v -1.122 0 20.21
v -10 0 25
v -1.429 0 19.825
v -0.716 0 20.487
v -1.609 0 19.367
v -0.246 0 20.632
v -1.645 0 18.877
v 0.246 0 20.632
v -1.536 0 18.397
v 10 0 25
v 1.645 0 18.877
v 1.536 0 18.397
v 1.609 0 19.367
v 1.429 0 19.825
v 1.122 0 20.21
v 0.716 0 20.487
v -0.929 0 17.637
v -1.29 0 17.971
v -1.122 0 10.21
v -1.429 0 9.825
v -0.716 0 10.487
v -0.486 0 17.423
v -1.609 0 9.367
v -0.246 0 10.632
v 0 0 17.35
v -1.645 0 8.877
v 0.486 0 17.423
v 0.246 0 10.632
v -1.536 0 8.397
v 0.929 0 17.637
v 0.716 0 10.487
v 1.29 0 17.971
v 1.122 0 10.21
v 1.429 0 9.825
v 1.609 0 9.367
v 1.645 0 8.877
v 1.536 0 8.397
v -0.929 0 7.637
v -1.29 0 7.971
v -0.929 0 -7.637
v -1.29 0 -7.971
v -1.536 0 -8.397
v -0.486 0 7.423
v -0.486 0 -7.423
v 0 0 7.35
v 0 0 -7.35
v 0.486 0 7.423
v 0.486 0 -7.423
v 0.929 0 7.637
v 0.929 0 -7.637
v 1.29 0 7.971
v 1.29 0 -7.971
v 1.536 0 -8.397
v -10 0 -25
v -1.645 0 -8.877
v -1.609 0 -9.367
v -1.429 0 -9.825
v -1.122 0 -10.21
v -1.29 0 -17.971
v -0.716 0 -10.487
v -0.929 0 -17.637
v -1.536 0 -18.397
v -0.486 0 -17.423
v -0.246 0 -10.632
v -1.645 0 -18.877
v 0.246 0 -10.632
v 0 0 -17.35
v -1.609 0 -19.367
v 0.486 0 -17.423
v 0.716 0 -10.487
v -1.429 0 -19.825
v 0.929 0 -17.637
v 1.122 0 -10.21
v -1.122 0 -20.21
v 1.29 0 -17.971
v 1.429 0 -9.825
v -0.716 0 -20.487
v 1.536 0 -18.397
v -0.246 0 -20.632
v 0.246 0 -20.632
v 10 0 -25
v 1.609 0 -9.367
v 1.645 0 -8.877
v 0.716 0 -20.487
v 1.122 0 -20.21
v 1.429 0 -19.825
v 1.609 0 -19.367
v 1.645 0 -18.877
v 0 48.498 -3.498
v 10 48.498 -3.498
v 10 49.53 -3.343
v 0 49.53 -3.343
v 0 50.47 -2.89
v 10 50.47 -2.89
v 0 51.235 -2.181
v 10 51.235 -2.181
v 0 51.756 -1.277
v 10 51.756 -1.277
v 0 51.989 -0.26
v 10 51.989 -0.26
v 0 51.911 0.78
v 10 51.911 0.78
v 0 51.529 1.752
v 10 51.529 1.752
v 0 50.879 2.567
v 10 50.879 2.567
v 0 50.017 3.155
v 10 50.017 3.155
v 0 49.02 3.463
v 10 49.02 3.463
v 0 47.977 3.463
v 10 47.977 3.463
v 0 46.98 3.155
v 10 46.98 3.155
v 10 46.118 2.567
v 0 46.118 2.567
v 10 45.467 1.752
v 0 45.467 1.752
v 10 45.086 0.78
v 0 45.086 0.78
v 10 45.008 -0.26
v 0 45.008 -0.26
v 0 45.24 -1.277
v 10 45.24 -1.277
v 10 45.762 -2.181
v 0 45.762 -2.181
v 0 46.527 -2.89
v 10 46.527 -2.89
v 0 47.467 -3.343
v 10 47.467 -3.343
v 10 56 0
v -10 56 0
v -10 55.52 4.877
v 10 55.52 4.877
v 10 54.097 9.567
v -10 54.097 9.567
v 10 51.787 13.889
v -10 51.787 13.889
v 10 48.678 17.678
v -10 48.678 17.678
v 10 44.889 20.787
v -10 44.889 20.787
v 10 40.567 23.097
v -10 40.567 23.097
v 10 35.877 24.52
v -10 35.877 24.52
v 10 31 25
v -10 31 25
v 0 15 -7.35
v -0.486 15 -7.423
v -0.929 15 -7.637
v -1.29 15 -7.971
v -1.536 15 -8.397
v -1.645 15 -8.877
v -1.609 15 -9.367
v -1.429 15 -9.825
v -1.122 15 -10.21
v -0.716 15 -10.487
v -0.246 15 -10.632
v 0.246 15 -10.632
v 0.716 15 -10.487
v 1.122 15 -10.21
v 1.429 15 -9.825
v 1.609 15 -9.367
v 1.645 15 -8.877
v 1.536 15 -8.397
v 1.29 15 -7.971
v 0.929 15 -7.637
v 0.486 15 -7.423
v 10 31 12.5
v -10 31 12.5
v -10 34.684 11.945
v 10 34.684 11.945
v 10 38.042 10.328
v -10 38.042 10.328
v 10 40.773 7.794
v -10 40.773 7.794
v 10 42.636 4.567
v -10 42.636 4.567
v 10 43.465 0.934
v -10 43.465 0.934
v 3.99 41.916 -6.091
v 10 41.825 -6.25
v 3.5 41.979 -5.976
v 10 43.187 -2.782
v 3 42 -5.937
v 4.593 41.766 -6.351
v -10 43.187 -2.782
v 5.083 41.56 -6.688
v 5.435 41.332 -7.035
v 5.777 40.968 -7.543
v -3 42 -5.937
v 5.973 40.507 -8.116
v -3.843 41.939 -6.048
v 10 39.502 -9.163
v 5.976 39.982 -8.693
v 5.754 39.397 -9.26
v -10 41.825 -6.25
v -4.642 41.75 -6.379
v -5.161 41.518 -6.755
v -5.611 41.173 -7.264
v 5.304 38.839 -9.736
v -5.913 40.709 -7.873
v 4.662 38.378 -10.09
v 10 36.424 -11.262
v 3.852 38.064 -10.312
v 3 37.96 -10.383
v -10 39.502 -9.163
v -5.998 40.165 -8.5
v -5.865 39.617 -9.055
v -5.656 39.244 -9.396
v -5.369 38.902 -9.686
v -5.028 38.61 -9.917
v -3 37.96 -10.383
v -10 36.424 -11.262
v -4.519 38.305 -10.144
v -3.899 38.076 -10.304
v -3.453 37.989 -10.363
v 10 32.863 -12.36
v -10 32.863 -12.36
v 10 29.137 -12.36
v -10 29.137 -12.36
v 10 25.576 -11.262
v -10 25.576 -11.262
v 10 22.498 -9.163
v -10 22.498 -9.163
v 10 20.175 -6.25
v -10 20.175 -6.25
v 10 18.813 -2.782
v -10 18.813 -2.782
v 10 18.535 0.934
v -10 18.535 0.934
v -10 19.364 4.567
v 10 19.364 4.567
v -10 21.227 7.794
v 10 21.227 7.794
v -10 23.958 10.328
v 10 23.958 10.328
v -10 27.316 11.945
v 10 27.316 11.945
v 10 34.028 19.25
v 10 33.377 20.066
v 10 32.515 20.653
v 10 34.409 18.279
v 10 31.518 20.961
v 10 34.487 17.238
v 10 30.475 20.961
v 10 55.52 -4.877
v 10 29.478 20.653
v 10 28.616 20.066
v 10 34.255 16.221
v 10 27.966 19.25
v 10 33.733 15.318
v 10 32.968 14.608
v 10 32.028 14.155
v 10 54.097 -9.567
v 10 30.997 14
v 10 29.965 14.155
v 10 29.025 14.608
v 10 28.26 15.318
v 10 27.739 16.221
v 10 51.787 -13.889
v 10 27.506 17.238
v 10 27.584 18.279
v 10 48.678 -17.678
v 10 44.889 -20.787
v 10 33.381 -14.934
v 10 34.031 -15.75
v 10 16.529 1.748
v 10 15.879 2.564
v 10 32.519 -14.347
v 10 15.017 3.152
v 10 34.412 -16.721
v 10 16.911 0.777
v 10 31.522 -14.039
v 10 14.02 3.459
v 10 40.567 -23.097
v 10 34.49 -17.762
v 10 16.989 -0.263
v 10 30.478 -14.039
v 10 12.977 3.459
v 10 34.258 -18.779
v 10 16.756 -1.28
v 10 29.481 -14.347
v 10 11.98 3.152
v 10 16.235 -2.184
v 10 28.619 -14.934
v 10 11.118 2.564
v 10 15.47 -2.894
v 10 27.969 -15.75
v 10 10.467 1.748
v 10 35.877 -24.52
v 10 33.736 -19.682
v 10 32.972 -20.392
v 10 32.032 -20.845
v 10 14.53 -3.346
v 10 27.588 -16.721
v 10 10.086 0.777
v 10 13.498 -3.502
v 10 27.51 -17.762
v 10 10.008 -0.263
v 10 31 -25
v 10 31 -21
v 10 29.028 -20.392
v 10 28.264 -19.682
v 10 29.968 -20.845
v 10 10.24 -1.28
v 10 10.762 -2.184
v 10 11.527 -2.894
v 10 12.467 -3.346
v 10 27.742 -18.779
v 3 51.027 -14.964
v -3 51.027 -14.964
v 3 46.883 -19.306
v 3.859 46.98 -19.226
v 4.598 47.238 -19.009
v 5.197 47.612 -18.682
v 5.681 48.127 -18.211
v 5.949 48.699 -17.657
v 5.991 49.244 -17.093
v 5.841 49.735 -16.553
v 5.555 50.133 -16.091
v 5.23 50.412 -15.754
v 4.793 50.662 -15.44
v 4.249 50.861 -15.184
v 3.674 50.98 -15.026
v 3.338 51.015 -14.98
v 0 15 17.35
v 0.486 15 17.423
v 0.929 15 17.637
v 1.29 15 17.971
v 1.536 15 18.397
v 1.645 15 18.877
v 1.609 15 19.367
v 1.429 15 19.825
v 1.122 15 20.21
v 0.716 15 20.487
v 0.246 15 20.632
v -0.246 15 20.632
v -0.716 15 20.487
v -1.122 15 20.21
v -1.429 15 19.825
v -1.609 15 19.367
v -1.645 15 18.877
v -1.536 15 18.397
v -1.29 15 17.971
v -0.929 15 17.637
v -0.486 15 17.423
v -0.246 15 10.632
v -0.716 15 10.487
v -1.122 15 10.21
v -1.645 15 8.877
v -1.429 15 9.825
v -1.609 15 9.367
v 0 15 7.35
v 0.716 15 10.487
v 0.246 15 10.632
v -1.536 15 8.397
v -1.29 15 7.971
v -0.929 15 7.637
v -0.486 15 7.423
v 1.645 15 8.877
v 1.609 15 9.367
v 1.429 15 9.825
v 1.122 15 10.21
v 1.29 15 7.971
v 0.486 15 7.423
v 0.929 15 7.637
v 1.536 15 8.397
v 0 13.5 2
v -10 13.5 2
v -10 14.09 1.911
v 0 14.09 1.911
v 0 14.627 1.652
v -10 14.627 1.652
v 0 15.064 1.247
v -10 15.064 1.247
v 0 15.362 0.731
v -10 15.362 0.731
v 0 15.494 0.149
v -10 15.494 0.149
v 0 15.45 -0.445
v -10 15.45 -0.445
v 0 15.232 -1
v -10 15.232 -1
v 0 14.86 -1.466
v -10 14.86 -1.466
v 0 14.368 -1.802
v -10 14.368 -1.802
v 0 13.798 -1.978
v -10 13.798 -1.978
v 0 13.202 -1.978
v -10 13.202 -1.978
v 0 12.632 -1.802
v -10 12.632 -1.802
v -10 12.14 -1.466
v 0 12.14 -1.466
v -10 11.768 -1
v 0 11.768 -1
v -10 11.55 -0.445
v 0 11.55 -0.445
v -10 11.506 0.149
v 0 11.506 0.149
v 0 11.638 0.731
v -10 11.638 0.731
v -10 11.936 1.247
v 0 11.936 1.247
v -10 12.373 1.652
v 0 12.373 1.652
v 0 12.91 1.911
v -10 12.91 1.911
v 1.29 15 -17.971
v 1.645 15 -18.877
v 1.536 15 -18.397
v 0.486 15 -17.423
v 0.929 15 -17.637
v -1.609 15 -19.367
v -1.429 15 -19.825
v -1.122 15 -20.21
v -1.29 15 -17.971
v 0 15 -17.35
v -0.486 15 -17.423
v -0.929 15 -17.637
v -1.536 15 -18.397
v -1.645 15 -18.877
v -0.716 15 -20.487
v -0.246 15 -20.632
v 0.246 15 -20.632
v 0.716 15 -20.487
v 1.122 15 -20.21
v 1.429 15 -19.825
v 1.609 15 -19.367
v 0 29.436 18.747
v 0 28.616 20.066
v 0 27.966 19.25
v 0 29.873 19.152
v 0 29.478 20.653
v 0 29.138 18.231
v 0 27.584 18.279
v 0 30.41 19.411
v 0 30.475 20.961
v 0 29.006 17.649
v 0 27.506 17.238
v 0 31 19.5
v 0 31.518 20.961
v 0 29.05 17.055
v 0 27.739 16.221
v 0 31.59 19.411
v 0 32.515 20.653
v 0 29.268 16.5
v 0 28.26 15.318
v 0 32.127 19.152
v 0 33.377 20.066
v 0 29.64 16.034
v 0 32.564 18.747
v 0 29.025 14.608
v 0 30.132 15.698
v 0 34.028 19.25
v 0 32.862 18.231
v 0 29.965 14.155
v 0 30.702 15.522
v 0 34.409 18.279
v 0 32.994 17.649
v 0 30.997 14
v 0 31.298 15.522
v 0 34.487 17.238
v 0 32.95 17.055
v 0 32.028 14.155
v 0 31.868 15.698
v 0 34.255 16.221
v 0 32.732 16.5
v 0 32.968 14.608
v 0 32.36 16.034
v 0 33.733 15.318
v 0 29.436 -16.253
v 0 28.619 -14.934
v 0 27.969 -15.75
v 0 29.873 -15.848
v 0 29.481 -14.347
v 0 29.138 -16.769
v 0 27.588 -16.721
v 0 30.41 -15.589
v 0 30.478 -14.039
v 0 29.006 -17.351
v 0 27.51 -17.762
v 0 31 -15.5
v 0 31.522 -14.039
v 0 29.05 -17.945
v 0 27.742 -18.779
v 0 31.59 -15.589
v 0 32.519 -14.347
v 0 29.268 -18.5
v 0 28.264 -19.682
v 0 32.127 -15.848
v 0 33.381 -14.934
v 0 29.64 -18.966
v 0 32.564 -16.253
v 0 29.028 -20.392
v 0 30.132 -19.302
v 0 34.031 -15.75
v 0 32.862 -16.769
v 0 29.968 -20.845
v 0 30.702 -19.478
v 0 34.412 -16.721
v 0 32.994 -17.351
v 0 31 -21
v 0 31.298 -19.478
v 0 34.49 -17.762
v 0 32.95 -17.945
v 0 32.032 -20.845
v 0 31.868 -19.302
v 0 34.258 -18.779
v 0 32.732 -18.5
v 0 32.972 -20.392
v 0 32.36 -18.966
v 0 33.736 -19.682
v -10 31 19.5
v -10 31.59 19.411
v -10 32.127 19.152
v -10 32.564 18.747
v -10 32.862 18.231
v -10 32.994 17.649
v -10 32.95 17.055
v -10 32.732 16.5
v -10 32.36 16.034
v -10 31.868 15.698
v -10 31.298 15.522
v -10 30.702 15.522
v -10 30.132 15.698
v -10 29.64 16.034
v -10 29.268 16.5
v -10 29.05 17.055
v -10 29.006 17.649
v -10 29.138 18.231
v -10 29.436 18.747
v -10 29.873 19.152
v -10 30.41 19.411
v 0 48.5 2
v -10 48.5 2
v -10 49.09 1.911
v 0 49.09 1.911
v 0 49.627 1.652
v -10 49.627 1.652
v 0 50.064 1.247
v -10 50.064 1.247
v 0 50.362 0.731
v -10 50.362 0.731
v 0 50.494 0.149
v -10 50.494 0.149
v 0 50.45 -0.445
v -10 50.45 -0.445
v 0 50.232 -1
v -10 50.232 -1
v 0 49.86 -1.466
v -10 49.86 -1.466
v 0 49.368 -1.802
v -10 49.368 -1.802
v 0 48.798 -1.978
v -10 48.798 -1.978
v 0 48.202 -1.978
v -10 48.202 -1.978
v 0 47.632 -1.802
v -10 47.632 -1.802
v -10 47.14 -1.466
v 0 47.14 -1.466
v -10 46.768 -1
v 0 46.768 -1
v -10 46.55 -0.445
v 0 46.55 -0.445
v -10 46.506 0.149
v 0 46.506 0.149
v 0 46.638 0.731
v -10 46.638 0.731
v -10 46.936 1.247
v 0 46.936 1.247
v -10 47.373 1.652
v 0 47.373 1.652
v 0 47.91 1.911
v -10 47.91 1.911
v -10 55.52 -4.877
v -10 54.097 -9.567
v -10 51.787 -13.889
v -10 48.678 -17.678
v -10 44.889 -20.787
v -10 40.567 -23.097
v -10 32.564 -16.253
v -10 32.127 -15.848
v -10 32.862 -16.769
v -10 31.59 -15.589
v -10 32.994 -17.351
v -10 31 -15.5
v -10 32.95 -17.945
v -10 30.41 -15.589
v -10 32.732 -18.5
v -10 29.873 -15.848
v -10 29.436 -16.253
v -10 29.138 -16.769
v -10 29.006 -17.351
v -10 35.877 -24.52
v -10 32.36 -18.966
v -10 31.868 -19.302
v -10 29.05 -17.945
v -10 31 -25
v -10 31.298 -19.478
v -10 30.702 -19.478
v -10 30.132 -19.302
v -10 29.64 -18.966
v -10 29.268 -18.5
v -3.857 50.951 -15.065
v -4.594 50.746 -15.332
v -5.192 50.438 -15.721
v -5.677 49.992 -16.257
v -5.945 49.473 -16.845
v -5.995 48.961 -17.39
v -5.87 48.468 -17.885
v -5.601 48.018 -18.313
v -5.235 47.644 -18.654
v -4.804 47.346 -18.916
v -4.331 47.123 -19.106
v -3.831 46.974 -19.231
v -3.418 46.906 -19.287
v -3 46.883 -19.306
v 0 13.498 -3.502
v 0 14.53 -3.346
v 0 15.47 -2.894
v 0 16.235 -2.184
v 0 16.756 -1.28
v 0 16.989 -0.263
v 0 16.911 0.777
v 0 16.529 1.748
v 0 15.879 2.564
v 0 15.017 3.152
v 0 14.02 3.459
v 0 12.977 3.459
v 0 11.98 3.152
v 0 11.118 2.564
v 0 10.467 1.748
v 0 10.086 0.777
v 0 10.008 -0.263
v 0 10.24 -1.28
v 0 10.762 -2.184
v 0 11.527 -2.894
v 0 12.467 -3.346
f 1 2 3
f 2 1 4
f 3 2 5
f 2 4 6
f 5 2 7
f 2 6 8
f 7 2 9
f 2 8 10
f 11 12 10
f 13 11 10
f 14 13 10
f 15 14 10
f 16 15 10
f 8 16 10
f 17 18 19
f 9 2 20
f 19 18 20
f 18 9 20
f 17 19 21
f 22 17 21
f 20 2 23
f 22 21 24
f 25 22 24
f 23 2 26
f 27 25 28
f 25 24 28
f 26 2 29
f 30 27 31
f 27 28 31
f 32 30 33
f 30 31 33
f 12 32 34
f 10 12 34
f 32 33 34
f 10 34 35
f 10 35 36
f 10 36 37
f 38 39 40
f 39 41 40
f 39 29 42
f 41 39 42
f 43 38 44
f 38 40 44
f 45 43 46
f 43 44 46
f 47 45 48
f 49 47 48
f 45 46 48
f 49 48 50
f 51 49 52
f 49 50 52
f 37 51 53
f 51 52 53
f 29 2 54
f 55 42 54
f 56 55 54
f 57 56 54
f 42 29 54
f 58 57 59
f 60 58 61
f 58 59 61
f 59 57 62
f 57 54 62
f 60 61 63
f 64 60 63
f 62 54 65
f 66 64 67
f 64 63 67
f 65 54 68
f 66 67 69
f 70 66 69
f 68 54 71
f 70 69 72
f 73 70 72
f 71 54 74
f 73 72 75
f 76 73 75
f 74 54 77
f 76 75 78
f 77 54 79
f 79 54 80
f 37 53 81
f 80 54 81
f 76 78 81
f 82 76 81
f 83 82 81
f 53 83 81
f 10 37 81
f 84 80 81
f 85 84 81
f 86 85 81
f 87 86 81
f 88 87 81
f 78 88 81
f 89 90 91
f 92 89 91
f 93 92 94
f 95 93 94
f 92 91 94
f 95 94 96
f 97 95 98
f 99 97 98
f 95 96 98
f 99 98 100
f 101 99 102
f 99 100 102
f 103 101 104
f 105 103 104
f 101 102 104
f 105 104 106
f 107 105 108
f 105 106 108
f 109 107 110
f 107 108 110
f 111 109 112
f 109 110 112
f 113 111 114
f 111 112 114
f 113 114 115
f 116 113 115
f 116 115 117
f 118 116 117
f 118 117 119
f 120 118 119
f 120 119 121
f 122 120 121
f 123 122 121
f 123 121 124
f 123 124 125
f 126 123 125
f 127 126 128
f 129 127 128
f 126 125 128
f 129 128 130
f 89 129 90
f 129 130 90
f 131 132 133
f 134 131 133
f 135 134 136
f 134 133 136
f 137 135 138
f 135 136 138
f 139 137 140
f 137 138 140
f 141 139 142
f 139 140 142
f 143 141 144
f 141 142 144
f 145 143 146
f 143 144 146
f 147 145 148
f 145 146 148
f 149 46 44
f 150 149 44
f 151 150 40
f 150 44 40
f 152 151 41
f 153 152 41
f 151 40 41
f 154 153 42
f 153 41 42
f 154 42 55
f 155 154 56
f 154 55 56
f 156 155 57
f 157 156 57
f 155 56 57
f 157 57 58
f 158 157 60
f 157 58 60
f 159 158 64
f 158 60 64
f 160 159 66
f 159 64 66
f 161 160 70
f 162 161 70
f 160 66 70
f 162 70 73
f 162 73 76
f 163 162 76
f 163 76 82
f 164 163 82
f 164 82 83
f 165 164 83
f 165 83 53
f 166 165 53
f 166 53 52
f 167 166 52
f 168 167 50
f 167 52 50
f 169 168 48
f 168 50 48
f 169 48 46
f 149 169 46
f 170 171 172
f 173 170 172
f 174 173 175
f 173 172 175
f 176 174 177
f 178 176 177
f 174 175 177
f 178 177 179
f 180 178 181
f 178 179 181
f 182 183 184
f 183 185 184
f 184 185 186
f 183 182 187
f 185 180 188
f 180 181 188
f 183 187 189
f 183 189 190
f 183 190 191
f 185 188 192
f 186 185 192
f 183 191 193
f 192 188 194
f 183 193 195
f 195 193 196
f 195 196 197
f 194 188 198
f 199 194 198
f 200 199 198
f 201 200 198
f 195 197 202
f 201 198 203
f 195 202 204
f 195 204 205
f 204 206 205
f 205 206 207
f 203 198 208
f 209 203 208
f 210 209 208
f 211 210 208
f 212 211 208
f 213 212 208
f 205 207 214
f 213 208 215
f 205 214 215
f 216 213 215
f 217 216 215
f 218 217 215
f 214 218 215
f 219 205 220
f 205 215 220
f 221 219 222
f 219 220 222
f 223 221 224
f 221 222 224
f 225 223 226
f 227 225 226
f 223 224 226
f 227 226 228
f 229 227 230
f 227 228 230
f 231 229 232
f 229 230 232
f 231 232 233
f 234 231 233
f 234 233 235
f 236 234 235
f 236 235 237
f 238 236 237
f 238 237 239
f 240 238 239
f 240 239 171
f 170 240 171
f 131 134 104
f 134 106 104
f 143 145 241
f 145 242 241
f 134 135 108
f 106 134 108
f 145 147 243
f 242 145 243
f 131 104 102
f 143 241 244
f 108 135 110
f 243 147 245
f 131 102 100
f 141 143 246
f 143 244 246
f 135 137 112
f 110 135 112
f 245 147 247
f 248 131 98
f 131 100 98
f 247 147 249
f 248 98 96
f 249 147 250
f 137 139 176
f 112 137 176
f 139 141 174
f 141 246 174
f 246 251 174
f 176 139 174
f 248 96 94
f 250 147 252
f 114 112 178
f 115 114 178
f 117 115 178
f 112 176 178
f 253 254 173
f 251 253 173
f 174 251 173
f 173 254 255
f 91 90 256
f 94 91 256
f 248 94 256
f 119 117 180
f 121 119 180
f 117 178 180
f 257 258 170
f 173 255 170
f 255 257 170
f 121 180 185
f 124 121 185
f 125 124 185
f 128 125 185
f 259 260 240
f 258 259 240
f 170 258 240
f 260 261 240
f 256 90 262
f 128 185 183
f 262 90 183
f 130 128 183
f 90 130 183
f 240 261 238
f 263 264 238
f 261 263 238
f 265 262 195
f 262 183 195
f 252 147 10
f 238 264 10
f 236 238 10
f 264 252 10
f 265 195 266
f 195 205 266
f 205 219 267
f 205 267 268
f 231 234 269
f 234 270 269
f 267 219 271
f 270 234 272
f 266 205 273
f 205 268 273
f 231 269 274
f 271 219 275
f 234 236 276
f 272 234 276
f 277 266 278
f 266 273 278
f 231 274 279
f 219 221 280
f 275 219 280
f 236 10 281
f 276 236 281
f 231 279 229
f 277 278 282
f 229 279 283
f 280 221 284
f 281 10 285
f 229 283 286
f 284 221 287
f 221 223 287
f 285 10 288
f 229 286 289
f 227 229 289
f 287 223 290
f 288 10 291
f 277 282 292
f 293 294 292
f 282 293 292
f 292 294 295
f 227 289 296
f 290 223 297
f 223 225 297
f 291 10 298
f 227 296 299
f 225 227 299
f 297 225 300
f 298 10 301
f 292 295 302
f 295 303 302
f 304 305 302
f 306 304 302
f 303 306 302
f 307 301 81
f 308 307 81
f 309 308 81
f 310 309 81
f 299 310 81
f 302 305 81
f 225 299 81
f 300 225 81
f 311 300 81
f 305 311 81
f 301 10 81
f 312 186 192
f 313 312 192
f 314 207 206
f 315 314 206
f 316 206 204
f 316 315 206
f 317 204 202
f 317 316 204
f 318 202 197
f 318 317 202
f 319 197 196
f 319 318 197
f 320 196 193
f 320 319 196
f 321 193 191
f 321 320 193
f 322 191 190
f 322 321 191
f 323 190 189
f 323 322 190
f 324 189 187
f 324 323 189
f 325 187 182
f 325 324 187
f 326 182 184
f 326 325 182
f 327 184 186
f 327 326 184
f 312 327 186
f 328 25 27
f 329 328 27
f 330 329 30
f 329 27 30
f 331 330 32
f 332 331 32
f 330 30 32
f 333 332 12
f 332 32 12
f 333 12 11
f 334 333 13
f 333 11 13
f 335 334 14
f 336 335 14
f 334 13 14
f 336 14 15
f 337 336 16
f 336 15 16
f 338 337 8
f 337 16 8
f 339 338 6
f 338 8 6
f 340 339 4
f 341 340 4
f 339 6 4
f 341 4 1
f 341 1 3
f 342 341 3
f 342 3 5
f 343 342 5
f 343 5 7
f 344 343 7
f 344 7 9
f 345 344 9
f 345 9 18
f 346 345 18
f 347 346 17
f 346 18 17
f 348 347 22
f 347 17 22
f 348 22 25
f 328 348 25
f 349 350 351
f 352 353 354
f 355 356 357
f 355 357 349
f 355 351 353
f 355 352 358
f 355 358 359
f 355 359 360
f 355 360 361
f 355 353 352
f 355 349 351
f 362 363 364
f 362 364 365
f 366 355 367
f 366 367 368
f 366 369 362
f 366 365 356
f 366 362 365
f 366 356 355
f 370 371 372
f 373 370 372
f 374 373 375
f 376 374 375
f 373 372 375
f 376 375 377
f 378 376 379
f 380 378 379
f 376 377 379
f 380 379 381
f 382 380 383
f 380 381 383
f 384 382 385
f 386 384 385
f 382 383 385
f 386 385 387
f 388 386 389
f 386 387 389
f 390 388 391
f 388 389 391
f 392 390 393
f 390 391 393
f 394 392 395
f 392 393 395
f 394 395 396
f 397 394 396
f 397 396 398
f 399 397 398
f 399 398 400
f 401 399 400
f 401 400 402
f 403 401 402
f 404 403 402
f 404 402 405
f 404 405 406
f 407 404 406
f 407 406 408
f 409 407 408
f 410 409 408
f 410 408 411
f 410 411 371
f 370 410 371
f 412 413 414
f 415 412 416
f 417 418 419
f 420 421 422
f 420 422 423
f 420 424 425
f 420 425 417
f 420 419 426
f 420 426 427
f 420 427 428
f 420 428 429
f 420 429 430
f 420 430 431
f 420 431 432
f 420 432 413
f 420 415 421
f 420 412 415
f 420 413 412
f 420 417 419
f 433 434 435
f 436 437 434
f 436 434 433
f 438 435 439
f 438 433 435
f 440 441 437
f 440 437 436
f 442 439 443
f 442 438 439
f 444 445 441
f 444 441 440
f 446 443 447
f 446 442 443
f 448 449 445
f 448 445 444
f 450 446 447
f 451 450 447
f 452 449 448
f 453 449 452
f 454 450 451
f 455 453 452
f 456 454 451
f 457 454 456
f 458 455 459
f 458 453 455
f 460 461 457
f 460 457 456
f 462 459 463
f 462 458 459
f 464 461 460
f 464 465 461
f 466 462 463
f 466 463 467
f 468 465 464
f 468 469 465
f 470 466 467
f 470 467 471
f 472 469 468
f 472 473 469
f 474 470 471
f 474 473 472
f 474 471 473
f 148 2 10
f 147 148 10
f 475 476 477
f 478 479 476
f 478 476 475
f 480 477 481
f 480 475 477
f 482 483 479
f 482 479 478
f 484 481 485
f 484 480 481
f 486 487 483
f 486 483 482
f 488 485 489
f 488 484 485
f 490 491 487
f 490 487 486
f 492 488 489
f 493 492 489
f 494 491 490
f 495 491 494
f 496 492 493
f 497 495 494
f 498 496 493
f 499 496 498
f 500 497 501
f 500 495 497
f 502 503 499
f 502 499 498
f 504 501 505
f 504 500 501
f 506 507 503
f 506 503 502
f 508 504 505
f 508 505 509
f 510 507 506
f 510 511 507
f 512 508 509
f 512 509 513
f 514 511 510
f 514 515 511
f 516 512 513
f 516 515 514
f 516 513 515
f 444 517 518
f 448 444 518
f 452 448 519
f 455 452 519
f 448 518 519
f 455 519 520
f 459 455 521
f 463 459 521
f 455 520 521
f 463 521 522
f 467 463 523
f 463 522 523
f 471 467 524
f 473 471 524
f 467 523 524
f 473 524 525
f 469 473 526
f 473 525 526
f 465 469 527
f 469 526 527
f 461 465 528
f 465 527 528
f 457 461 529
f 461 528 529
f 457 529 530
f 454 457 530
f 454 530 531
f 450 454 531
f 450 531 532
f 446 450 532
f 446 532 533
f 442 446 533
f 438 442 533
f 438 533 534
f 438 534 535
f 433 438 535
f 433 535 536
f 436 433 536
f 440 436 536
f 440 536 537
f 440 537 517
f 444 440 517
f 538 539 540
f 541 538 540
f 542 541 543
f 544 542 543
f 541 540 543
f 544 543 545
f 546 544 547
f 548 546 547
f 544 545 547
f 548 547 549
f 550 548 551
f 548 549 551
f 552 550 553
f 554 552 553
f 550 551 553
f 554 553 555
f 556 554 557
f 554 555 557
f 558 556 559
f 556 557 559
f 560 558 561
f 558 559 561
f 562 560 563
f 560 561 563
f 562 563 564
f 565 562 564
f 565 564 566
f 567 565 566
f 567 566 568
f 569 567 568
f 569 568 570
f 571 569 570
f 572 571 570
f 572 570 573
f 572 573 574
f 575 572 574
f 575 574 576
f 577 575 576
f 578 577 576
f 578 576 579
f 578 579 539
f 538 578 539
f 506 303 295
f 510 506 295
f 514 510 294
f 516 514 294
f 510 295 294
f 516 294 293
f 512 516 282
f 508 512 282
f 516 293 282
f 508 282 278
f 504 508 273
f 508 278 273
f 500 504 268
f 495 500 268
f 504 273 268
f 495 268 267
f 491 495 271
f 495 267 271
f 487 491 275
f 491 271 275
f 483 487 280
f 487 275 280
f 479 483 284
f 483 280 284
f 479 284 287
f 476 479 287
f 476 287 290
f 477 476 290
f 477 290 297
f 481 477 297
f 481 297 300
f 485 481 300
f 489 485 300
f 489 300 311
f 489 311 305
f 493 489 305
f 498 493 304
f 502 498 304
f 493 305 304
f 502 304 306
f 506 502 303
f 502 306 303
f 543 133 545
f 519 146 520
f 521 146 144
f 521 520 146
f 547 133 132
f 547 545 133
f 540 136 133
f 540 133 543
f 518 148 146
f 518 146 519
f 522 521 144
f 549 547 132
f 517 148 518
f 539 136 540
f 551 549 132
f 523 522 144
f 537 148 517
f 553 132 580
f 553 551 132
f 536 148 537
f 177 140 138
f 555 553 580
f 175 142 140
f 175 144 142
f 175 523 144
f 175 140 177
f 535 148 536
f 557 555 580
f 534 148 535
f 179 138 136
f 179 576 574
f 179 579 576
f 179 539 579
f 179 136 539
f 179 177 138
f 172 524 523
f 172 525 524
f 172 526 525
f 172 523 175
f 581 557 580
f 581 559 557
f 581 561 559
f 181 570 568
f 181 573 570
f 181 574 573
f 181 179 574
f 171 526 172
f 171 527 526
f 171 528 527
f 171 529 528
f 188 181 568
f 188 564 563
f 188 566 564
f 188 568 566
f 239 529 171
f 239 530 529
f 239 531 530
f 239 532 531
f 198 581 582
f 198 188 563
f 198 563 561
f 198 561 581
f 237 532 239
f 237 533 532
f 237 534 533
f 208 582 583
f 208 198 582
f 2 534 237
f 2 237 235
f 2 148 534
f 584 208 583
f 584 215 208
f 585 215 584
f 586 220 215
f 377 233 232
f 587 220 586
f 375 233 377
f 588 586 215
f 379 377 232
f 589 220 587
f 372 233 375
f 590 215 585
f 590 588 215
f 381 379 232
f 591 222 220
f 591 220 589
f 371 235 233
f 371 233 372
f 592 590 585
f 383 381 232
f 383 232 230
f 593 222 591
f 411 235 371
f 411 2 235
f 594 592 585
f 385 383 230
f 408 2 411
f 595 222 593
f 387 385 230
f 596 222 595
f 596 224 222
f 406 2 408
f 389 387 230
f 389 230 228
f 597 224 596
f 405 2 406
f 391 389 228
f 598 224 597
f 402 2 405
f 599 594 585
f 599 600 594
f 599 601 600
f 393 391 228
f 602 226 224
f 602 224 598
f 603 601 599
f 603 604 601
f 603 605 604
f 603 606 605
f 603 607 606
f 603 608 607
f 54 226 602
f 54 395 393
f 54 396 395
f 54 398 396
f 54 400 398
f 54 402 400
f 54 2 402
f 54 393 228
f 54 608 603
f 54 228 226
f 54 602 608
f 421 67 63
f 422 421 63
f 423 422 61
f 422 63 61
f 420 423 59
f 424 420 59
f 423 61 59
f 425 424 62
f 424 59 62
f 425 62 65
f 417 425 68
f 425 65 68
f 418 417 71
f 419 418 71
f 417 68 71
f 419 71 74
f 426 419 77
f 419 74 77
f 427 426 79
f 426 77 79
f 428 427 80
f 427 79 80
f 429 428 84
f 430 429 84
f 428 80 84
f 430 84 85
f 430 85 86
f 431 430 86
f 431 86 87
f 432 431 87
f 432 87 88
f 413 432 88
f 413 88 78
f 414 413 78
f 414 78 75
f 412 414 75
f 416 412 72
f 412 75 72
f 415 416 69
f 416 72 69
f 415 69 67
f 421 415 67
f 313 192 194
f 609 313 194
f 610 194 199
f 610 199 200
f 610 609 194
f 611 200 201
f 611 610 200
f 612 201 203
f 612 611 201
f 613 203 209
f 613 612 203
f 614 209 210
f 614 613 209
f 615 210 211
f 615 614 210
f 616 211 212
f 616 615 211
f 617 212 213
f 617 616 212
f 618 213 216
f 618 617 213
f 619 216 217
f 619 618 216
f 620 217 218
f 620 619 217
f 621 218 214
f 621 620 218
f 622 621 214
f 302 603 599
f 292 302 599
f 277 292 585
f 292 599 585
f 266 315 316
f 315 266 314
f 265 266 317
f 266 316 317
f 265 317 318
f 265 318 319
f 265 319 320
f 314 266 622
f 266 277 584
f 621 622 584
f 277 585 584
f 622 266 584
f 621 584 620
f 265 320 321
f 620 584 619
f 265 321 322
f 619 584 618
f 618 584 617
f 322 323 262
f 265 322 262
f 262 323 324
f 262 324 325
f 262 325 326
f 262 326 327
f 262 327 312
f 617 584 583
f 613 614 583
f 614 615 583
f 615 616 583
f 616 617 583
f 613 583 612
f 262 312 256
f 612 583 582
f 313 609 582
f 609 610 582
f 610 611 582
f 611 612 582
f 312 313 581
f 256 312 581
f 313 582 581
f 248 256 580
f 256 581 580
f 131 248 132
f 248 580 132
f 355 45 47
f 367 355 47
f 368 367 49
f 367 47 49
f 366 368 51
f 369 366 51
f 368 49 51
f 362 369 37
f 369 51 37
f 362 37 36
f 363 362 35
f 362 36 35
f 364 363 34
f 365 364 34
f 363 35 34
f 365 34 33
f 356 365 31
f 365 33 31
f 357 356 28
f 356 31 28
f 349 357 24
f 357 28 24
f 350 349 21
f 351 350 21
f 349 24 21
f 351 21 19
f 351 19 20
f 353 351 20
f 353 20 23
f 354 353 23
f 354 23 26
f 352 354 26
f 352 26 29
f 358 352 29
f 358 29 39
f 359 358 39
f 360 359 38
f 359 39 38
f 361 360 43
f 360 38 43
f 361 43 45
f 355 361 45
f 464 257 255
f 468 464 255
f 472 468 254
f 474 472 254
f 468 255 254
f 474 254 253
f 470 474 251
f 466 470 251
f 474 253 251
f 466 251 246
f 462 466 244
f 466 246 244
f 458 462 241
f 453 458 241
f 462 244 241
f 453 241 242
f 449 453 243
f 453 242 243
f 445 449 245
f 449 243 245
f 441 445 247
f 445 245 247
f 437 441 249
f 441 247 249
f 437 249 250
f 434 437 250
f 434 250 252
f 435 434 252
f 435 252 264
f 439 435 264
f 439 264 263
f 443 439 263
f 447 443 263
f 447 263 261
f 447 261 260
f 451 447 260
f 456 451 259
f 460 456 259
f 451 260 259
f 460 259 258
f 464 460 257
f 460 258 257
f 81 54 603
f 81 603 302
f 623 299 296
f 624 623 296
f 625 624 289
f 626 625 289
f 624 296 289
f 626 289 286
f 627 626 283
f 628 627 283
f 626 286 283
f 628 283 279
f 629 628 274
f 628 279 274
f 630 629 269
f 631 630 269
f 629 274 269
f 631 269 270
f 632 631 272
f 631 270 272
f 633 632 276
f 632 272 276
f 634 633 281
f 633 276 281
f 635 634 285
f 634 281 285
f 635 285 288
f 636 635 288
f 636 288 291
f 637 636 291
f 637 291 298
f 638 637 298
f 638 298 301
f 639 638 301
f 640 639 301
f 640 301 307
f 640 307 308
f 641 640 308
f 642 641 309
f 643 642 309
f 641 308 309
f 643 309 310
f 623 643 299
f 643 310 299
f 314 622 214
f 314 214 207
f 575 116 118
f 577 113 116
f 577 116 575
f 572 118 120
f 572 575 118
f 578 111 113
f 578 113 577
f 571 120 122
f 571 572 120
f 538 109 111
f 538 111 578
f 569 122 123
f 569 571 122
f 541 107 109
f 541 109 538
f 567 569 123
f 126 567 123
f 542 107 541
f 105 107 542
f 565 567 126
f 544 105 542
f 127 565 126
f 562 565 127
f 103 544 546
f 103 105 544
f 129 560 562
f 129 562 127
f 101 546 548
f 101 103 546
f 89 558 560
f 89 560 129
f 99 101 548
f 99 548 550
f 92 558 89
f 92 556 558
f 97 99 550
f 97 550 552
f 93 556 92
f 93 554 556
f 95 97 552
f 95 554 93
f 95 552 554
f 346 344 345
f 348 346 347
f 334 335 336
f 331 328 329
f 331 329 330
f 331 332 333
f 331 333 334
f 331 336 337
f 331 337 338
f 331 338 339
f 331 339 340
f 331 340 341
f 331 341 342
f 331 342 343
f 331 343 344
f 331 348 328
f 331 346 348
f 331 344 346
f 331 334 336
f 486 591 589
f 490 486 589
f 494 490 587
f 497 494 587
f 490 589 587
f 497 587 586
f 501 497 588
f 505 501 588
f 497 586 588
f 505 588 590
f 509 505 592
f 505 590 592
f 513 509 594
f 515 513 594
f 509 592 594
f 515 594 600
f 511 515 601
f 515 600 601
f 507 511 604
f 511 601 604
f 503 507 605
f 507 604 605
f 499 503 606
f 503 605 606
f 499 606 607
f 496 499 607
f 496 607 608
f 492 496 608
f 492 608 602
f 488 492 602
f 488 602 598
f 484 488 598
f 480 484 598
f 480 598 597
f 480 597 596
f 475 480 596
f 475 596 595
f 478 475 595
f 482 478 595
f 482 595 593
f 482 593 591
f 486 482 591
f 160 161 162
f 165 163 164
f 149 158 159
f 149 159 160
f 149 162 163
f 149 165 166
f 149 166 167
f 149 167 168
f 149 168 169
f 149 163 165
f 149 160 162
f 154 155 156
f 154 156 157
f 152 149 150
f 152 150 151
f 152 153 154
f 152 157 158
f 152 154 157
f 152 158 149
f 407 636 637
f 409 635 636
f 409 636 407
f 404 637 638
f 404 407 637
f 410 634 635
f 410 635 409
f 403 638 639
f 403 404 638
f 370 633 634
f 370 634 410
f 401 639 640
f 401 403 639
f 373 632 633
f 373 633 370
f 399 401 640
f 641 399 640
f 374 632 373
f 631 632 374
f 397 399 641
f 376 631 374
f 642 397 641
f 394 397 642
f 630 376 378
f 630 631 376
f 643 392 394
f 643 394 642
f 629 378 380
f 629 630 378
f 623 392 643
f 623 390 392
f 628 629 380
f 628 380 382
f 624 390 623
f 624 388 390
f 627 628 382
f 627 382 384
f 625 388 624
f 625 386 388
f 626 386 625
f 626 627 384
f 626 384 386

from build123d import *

# Parameters (mm, degrees)
SKIZZE1_W                       = 20
SKIZZE1_H                       = 50
AUFSATZ_LINEAR_AUSTRAGEN1_DEPTH = 56
SKIZZE2_R                       = 12.5
SKIZZE2_R_2                     = 2
SCHNITT_LINEAR_AUSTRAGEN1_DEPTH = 65.505813691
SKIZZE3_R                       = 1.65
SCHNITT_LINEAR_AUSTRAGEN2_DEPTH = 15
SKIZZE6_R                       = 3.5
SCHNITT_LINEAR_AUSTRAGEN5_DEPTH = 10
CUT_EXTRUDE1_DEPTH              = 17


with BuildPart() as part:
    # Skizze1 → Aufsatz-Linear austragen1 (new body)
    with BuildSketch(Plane(origin=(0, 0, 0), x_dir=(1, 0, 0), z_dir=(0, 1, 0))):
        Rectangle(SKIZZE1_W, SKIZZE1_H)
    extrude(amount=AUFSATZ_LINEAR_AUSTRAGEN1_DEPTH)

    # Skizze2 → Schnitt-Linear austragen1 (cut, through all)
    with BuildSketch(Plane.ZY.offset(10)):
        with BuildLine():
            Line((-25, 56), (-25, 31))
            ThreePointArc((-25, 31), (-17.677669509, 48.67766955), (5.8e-08, 56))
            Line((5.8e-08, 56), (-25, 56))
        make_face()
        with BuildLine():
            ThreePointArc((5.8e-08, 56), (17.67766955, 48.677669509), (25, 31))
            Line((25, 31), (25, 56))
            Line((25, 56), (5.8e-08, 56))
        make_face()
        with Locations((0, 31)):
            Circle(SKIZZE2_R)
        with Locations((17.5, 31)):
            Circle(SKIZZE2_R_2)
        with Locations((0, 48.5)):
            Circle(SKIZZE2_R_2)
        with Locations((0, 13.5)):
            Circle(SKIZZE2_R_2)
        with Locations((-17.5, 31)):
            Circle(SKIZZE2_R_2)
    extrude(amount=-SCHNITT_LINEAR_AUSTRAGEN1_DEPTH, mode=Mode.SUBTRACT)

    # Skizze3 → Schnitt-Linear austragen2 (cut)
    with BuildSketch(Plane.XZ):
        with Locations(Location((0, 19, 0), (0, 0, 270))):
            Circle(SKIZZE3_R)
        with Locations(Location((0, 9, 0), (0, 0, 270))):
            Circle(SKIZZE3_R)
        with Locations(Location((0, -9, 0), (0, 0, 90))):
            Circle(SKIZZE3_R)
        with Locations(Location((0, -19, 0), (0, 0, 90))):
            Circle(SKIZZE3_R)
    extrude(amount=-SCHNITT_LINEAR_AUSTRAGEN2_DEPTH, mode=Mode.SUBTRACT)

    # Skizze6 → Schnitt-Linear austragen5 (cut)
    with BuildSketch(Plane(origin=(10, 0, 0), x_dir=(0, 0, -1), z_dir=(1, 0, 0))):
        with Locations((17.5, 31)):
            Circle(SKIZZE6_R)
        with Locations((0.001666066, 13.498333934)):
            Circle(SKIZZE6_R)
        with Locations((-17.5, 30.996667867)):
            Circle(SKIZZE6_R)
        with Locations((-0.001666066, 48.498333934)):
            Circle(SKIZZE6_R)
    extrude(amount=-SCHNITT_LINEAR_AUSTRAGEN5_DEPTH, mode=Mode.SUBTRACT)

    # Sketch1 → Cut-Extrude1 (cut)
    with BuildSketch(Plane(origin=(0, 33.17766953, -33.17766953), x_dir=(-1, 0, 0), z_dir=(0, 0.7071067811865537, -0.7071067811865414))):
        with BuildLine():
            Line((-3, 25.5), (3, 25.5))
            ThreePointArc((3, 25.5), (6, 22.5), (3, 19.5))
            Line((3, 19.5), (-3, 19.5))
            ThreePointArc((-3, 19.5), (-6, 22.5), (-3, 25.5))
        make_face()
    extrude(amount=-CUT_EXTRUDE1_DEPTH, mode=Mode.SUBTRACT)


solid = part.part
